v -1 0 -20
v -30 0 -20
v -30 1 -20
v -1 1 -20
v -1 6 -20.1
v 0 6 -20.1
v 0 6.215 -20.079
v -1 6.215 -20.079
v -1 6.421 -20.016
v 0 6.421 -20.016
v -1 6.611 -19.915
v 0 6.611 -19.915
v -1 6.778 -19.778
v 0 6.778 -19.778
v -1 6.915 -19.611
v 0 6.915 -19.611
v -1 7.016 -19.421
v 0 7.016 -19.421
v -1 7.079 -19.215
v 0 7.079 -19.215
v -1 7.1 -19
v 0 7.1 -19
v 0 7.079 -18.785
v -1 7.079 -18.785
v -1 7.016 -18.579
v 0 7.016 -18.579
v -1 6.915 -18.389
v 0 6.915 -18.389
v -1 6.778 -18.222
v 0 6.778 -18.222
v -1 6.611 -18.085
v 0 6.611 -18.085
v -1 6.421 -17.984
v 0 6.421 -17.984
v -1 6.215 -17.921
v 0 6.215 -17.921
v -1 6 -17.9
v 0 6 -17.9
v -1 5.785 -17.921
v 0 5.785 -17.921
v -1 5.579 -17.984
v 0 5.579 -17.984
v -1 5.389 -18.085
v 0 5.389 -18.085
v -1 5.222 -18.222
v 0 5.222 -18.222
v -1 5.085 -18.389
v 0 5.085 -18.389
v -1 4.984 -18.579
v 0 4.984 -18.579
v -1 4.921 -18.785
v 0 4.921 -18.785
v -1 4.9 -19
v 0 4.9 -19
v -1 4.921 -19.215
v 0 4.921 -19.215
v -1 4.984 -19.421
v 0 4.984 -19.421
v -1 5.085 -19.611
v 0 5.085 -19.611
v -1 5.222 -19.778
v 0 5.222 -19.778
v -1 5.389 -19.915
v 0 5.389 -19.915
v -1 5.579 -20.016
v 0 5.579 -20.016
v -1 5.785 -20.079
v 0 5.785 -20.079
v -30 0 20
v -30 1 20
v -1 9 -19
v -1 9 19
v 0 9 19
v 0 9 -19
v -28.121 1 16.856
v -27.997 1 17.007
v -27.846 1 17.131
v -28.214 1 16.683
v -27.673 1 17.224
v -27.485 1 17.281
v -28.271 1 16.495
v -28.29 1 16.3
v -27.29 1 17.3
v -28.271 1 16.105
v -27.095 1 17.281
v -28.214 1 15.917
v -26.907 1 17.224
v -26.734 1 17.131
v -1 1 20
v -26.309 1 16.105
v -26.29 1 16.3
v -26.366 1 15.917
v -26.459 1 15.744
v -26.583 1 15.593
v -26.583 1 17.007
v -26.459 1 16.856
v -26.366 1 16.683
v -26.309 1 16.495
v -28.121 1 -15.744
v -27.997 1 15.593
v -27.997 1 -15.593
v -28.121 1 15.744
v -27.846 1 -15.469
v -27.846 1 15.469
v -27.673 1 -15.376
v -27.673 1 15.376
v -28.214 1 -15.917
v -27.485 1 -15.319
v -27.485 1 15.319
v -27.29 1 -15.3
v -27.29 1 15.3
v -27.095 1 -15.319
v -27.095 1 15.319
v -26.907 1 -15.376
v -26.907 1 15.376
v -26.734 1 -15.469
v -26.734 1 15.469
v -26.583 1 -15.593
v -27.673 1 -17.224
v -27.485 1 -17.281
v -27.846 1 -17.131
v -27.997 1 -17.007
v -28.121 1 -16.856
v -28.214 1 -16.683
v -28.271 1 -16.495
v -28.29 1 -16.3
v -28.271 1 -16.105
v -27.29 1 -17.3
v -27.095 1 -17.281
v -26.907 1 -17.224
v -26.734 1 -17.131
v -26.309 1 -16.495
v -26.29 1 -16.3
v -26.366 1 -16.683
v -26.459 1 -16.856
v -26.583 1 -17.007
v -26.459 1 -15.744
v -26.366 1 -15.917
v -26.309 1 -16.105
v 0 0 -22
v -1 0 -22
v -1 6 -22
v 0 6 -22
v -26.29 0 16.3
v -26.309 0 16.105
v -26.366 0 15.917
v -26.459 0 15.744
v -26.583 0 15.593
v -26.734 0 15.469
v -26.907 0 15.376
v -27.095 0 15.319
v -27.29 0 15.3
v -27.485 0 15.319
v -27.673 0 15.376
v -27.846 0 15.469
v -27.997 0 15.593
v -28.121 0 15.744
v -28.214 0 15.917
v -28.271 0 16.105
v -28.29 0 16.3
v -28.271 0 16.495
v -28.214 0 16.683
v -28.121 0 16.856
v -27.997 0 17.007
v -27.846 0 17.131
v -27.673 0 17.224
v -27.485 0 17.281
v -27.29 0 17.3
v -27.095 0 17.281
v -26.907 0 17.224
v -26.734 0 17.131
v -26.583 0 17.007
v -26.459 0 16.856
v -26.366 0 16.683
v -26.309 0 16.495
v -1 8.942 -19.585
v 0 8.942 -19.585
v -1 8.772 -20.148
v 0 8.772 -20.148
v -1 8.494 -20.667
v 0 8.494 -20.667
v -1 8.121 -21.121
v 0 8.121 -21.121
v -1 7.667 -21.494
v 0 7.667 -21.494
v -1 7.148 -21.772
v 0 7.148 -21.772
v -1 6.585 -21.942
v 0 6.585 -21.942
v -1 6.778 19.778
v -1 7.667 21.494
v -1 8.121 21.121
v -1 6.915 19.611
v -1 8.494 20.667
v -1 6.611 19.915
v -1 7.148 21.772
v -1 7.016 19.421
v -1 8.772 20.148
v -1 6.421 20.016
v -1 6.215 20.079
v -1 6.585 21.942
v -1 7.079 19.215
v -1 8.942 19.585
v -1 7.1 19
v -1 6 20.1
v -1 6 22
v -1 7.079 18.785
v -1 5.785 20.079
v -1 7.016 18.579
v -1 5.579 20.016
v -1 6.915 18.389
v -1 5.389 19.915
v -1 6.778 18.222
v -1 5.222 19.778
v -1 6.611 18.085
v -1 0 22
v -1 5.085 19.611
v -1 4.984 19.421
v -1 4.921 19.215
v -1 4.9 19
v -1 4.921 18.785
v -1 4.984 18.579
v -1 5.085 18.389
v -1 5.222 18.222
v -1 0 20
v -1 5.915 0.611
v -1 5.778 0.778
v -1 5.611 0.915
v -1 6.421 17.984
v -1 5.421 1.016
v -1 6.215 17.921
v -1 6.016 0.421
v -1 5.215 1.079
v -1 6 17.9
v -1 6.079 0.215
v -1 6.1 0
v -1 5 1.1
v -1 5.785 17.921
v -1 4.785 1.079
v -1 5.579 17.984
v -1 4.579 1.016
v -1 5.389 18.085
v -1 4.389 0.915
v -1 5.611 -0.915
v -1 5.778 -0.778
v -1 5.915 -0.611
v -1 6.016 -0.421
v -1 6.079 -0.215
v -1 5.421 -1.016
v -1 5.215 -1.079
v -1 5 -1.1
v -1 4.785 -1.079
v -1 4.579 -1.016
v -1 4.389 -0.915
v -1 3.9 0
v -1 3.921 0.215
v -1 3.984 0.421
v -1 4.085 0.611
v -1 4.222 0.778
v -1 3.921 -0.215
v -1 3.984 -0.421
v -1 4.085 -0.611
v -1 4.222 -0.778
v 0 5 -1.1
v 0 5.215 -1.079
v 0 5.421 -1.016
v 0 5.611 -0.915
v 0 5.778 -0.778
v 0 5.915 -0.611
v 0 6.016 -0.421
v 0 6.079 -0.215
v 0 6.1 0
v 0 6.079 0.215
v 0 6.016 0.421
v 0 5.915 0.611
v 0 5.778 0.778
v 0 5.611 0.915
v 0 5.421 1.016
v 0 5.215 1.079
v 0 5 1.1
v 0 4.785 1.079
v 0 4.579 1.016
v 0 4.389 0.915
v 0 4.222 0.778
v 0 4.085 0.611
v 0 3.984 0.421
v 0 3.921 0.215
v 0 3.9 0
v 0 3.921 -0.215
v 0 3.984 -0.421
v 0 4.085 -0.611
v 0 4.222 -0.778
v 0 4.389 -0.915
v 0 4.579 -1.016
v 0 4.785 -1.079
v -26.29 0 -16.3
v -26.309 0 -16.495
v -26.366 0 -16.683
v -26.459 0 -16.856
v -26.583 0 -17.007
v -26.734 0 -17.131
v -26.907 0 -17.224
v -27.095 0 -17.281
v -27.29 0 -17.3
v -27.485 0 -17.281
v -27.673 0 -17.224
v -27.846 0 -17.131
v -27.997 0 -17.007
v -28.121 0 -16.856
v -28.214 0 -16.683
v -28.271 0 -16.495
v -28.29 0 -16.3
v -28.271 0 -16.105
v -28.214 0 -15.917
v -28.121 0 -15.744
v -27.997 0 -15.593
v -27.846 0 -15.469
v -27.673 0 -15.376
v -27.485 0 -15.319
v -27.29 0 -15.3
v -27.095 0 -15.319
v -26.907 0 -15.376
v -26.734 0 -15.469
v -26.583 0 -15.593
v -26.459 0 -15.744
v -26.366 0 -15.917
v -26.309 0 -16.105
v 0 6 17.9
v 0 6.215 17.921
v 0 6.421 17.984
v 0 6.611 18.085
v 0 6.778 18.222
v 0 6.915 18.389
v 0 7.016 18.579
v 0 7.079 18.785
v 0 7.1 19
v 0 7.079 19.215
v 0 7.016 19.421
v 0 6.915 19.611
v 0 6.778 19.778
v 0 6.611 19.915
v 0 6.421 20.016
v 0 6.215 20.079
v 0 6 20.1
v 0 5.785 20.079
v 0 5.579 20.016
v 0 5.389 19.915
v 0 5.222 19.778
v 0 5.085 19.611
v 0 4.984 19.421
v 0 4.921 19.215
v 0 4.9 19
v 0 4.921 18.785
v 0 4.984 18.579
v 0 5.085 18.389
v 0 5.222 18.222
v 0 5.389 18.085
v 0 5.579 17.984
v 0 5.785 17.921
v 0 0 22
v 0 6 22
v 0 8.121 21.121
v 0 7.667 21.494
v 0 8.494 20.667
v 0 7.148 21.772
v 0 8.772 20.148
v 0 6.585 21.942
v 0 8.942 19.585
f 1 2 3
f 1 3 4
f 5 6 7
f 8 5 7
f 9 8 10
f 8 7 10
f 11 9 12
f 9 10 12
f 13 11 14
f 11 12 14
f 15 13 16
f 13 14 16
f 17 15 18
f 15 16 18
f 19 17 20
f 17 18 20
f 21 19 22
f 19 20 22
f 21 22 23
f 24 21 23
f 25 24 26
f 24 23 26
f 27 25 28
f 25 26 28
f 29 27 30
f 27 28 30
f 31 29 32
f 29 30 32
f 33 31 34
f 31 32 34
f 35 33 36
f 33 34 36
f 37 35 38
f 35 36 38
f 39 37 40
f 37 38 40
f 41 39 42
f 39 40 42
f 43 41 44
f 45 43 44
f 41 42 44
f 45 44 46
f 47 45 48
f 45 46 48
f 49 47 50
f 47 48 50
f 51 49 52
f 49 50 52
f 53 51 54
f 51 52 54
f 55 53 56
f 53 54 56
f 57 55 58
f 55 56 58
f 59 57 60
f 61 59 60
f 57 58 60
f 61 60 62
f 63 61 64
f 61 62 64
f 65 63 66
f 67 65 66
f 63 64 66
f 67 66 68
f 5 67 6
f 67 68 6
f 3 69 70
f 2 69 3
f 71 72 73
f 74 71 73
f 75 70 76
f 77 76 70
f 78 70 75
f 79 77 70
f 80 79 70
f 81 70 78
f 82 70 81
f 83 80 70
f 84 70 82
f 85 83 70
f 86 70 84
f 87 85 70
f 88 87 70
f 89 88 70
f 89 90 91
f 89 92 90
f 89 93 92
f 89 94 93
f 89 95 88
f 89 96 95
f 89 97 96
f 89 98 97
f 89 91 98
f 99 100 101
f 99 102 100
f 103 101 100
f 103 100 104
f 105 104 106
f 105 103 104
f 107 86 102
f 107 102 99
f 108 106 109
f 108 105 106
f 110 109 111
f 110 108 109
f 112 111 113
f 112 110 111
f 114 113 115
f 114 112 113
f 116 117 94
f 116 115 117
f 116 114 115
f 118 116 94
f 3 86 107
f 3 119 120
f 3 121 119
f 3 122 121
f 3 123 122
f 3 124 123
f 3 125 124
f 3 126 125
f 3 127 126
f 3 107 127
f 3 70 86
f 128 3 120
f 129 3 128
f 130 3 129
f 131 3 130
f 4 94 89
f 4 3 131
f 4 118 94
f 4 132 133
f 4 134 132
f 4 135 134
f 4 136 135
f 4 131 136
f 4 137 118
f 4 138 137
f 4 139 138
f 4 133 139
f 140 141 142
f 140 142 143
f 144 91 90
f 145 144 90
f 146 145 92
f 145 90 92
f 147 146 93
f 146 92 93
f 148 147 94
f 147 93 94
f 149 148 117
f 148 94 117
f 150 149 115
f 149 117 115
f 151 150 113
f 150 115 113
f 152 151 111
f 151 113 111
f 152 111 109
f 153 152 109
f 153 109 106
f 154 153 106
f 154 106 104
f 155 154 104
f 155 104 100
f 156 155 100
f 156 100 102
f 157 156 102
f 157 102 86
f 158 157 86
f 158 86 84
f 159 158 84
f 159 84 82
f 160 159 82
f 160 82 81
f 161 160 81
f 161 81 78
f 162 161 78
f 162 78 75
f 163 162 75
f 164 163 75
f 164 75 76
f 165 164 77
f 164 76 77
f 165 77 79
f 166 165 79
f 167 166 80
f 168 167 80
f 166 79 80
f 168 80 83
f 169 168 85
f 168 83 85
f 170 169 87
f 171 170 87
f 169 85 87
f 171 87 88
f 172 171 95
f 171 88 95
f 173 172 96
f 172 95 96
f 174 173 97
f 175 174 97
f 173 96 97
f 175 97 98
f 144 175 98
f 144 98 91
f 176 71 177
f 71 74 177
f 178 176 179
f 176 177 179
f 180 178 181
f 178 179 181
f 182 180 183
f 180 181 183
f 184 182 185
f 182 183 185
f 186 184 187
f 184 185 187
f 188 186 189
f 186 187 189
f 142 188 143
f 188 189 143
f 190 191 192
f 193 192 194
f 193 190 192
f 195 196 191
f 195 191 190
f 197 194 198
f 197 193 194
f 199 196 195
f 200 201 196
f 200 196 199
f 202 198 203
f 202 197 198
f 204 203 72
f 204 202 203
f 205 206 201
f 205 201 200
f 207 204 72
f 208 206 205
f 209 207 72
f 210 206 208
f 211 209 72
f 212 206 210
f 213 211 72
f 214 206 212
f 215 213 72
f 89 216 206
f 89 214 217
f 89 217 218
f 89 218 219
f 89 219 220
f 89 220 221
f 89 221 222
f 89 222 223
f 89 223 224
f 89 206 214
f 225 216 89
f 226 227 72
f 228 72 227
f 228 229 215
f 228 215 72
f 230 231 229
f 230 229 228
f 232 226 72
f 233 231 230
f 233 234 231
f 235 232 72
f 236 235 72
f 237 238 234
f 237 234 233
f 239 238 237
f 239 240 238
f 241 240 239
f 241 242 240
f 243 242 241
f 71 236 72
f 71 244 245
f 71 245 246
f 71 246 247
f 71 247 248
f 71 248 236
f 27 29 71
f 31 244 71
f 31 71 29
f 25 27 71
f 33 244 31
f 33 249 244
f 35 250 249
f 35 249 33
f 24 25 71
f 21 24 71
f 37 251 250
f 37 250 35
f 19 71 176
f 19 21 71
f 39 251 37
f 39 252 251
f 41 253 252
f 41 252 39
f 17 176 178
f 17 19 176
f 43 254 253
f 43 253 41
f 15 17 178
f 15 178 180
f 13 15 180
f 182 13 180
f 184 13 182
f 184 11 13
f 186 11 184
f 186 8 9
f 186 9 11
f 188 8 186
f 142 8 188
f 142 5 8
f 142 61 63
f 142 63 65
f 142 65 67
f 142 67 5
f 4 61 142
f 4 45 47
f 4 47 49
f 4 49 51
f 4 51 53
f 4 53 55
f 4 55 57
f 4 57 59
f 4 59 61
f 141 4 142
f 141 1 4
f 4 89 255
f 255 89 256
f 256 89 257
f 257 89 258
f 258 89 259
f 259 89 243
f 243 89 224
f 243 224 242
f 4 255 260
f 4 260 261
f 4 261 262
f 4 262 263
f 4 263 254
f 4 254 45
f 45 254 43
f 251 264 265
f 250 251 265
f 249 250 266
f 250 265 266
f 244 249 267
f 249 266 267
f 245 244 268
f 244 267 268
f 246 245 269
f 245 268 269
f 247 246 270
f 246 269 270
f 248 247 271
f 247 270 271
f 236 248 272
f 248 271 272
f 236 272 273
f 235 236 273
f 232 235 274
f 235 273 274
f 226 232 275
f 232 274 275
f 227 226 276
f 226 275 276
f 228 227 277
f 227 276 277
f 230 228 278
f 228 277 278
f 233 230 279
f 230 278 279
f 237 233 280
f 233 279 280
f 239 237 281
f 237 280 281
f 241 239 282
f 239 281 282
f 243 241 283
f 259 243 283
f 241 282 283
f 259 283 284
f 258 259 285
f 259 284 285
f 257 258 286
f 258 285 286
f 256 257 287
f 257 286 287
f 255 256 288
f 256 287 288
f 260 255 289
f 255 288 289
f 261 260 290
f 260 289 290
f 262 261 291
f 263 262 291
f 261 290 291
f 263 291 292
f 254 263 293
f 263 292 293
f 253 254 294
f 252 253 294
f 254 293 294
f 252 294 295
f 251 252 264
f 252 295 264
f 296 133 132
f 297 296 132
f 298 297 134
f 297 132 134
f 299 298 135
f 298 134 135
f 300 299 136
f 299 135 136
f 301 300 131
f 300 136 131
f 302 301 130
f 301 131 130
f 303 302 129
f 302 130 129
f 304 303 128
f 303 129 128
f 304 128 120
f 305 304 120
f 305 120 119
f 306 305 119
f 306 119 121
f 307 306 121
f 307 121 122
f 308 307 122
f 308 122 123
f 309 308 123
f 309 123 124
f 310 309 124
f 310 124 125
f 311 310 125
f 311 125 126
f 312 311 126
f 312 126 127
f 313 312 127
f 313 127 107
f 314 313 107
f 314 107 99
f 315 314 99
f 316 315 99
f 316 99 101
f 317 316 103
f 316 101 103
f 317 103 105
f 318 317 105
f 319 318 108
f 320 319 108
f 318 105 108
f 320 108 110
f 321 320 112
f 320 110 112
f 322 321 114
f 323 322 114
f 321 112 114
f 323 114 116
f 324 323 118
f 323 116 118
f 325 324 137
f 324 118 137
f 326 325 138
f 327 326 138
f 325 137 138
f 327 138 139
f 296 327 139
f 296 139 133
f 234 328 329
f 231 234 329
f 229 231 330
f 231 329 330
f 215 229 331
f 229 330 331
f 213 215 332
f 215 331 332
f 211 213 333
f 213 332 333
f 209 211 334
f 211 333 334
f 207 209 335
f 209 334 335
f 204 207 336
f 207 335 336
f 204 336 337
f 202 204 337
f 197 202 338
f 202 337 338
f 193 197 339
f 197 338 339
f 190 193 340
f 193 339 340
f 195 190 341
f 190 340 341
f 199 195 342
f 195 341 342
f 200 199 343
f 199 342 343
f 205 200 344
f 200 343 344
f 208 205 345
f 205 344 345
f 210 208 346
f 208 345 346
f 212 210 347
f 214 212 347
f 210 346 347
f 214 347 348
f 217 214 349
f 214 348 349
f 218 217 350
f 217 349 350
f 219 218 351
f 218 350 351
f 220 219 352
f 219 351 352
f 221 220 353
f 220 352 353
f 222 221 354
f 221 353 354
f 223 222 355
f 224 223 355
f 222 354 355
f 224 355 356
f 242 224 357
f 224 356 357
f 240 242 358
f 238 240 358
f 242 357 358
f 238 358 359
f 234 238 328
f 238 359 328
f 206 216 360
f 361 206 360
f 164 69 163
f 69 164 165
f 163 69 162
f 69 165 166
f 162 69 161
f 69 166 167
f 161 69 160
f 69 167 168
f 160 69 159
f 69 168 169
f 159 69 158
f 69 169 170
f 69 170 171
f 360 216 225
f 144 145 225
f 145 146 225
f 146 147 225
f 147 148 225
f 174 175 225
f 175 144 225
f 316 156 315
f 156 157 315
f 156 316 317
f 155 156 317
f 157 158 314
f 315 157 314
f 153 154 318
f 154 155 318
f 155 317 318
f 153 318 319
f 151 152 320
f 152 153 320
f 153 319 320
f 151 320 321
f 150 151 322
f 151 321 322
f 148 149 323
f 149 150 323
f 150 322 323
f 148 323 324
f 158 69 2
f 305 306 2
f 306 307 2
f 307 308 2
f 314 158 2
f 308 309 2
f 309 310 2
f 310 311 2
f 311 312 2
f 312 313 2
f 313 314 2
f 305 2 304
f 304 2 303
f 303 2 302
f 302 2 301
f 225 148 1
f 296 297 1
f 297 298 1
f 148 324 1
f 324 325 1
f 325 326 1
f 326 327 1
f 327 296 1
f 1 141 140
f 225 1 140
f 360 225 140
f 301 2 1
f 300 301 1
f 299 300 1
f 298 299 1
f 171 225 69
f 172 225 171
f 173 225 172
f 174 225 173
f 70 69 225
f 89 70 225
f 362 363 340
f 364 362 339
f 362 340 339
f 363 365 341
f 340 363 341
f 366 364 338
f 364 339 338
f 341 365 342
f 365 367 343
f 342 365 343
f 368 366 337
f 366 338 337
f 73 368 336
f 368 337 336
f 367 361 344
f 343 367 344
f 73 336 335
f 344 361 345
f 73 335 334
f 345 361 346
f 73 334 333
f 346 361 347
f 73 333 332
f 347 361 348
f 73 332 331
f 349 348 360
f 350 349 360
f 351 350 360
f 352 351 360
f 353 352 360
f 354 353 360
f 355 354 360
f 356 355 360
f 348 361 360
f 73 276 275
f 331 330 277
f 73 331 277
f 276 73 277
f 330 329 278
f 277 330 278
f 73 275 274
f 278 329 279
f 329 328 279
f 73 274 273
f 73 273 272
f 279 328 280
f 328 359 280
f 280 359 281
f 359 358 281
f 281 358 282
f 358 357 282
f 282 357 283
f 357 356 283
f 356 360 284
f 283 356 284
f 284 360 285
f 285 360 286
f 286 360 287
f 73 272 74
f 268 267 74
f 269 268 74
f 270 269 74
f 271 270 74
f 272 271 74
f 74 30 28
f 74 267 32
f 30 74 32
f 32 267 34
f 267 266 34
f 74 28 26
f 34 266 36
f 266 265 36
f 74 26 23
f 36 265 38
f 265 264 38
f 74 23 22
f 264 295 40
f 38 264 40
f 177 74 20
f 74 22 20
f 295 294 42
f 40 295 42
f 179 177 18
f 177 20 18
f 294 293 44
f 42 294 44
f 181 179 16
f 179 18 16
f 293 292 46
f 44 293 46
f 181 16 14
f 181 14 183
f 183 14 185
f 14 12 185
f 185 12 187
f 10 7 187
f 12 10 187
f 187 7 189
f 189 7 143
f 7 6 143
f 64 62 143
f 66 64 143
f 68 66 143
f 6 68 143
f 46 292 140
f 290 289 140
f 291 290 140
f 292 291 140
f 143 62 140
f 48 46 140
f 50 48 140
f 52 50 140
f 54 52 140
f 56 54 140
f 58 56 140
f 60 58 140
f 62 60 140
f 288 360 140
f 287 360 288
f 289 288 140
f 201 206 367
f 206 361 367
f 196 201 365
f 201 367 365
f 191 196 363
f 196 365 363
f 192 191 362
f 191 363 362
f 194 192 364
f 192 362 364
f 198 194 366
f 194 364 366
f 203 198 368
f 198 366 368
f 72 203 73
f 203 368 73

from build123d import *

# Parameters (mm, degrees)
SKETCH1_W                 = 30
SKETCH1_H                 = 40
BOSS_EXTRUDE1_DEPTH       = 1
SKETCH4_W                 = 1
SKETCH4_H                 = 44
BOSS_EXTRUDE2_DEPTH       = 9
SKETCH5_R                 = 1.1
CUT_EXTRUDE1_DEPTH        = 1
F_2_0MM_DOWEL_HOLE1_D     = 2
F_2_0MM_DOWEL_HOLE1_DEPTH = 2.6
F_2_0MM_DOWEL_HOLE1_TIP   = 0.600860619
FILLET3_R                 = 3


with BuildPart() as part:
    # Sketch1 → Boss-Extrude1 (new body)
    with BuildSketch(Plane(origin=(0, 0, 0), x_dir=(1, 0, 0), z_dir=(0, 1, 0))):
        with Locations((-15, 0)):
            Rectangle(SKETCH1_W, SKETCH1_H)
    extrude(amount=BOSS_EXTRUDE1_DEPTH)

    # Sketch4 → Boss-Extrude2 (add)
    with BuildSketch(Plane(origin=(0, 0, 0), x_dir=(1, 0, 0), z_dir=(0, 1, 0))):
        with Locations((-0.5, 0)):
            Rectangle(SKETCH4_W, SKETCH4_H)
    extrude(amount=BOSS_EXTRUDE2_DEPTH)

    # Sketch5 → Cut-Extrude1 (cut)
    with BuildSketch(Plane(origin=(0, 0, 0), x_dir=(0, 0, -1), z_dir=(1, 0, 0))):
        with Locations((-19, 6)):
            Circle(SKETCH5_R)
        with Locations((19, 6)):
            Circle(SKETCH5_R)
        with Locations((0, 5)):
            Circle(SKETCH5_R)
    extrude(amount=-CUT_EXTRUDE1_DEPTH, mode=Mode.SUBTRACT)

    # Ø2.0mm Dowel Hole1
    with Locations(Plane(origin=(0, 0, 0), x_dir=(-1, 0, 0), z_dir=(0, -1, 0))):
        with Locations((27.29, -16.3), (27.29, 16.3)):
            Hole(F_2_0MM_DOWEL_HOLE1_D / 2, depth=F_2_0MM_DOWEL_HOLE1_DEPTH)
            with Locations((0, 0, -(F_2_0MM_DOWEL_HOLE1_DEPTH + F_2_0MM_DOWEL_HOLE1_TIP / 2))):  # 118° drill point
                Cone(0, F_2_0MM_DOWEL_HOLE1_D / 2, F_2_0MM_DOWEL_HOLE1_TIP, mode=Mode.SUBTRACT)

    # Fillet3
    fillet3_edges = [part.edges().sort_by_distance(p)[0] for p in [
        (-0.5, 9, -22),
        (-0.5, 9, 22),
    ]]
    fillet(fillet3_edges, radius=FILLET3_R)


solid = part.part
